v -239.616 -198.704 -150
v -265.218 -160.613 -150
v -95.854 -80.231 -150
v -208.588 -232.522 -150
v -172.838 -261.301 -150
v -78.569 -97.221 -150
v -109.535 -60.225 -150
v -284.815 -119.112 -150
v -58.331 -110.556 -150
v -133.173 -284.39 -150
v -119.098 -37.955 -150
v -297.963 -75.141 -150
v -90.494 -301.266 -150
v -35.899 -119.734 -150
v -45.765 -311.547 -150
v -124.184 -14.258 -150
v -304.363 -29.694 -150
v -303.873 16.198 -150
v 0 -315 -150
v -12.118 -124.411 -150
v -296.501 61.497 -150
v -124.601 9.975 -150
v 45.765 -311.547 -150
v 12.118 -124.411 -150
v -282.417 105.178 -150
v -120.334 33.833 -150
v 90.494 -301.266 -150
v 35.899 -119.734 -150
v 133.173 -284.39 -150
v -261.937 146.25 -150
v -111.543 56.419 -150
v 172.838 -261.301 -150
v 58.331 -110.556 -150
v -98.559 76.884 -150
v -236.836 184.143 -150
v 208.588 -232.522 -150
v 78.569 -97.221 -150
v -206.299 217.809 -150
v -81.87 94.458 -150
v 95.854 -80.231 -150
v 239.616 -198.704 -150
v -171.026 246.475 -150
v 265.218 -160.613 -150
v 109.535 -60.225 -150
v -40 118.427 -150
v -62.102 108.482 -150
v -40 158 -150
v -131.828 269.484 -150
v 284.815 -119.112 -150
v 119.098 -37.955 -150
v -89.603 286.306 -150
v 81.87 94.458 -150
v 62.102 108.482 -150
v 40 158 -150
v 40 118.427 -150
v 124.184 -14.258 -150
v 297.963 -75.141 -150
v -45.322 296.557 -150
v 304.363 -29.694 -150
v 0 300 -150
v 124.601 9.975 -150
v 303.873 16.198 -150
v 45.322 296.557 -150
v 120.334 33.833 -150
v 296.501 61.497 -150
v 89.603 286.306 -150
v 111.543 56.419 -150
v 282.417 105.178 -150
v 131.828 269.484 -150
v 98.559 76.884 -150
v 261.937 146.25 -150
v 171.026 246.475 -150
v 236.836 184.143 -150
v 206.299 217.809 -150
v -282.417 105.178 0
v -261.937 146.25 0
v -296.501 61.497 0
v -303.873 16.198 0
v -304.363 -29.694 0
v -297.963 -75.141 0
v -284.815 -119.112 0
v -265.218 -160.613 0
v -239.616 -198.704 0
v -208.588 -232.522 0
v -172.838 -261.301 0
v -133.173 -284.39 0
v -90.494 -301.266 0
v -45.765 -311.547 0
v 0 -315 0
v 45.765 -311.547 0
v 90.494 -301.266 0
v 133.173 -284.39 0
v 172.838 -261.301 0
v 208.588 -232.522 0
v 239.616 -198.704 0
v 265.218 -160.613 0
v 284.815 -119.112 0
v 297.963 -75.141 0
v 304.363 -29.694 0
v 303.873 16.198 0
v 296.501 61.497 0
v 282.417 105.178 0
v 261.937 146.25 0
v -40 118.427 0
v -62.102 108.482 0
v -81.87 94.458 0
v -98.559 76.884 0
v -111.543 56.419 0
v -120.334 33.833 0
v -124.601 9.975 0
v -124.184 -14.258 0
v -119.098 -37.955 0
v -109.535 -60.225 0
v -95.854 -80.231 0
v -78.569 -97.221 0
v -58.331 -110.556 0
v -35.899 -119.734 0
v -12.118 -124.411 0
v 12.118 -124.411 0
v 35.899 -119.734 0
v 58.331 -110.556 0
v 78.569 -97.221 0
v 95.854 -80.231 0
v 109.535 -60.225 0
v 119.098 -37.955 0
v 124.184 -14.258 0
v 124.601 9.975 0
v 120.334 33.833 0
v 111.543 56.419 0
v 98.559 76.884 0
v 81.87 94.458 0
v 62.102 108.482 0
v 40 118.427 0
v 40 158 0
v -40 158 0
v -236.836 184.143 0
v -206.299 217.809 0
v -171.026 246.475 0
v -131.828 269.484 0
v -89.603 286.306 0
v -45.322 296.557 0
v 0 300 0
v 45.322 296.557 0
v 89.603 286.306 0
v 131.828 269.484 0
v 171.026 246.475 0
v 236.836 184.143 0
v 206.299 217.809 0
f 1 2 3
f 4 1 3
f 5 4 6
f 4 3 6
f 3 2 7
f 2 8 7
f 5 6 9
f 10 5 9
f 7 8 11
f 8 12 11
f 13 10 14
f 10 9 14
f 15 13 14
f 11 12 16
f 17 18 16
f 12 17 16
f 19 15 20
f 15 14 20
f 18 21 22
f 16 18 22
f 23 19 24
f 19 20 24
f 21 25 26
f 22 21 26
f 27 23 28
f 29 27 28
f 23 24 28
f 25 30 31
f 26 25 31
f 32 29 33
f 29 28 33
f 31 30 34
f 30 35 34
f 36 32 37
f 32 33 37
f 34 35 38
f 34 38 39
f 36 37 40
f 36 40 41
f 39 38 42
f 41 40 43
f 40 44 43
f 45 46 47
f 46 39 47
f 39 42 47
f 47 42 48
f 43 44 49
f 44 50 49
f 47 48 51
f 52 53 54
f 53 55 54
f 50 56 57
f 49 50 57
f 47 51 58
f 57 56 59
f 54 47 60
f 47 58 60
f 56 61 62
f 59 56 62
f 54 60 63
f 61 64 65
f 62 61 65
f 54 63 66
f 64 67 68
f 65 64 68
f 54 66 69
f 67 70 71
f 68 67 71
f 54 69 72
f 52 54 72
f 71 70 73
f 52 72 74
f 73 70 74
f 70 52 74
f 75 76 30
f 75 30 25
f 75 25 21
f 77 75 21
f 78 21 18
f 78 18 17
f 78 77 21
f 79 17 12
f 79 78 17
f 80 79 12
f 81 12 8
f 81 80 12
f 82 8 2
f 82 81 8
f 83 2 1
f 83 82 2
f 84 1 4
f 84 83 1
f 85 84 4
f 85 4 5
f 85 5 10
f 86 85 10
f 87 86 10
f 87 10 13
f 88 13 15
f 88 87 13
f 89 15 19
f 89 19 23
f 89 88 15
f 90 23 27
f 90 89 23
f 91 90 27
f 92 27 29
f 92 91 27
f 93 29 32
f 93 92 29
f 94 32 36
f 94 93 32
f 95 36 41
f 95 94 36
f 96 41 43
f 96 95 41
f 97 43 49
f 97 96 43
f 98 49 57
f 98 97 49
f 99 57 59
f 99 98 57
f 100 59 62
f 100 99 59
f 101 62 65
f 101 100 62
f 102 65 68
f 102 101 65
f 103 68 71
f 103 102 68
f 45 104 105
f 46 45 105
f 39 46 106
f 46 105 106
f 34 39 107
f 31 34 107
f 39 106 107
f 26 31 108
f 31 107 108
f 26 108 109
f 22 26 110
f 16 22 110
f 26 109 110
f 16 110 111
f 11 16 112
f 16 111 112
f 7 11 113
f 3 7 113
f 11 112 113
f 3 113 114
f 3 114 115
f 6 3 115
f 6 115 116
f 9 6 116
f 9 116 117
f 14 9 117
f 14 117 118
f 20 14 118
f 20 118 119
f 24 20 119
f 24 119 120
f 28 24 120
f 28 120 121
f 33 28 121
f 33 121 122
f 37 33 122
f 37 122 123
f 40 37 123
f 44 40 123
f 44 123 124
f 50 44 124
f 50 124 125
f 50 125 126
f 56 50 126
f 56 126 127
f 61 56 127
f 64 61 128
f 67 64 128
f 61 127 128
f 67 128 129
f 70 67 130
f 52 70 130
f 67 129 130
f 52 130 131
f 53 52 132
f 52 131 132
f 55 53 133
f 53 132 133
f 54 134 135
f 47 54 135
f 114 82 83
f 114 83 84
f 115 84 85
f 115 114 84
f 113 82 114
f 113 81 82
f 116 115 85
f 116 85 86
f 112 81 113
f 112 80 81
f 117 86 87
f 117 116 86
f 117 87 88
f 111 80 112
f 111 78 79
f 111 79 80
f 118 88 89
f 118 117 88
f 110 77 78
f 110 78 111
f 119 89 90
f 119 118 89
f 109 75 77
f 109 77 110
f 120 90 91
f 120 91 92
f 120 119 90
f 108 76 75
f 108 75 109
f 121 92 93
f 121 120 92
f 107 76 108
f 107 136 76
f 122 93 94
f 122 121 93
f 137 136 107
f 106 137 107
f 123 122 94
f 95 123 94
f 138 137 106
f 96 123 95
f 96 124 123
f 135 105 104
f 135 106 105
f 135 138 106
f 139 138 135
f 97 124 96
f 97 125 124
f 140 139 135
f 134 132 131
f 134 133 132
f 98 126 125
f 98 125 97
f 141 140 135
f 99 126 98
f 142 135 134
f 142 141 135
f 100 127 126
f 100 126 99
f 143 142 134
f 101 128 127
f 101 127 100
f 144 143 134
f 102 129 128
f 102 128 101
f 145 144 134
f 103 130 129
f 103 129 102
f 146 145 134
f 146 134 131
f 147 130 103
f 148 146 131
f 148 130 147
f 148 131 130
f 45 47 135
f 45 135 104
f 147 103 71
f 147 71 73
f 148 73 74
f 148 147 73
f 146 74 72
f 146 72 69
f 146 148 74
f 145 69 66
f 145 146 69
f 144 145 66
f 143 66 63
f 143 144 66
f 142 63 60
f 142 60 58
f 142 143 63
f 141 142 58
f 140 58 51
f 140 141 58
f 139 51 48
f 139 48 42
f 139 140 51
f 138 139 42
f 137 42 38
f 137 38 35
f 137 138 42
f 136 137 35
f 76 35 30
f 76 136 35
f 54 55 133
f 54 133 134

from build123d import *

# Parameters (mm, degrees)
F1_DEPTH = 150
F3_DEPTH = 264.16


with BuildPart() as f1:
    # F0 (on Top) → F1 (new body)
    with BuildSketch(Plane.XY):
        with BuildLine():
            ThreePointArc((-261.9368960265, 146.25), (-75.5610057902, -290.3283217393), (300, 0))
            ThreePointArc((300, 0), (290.3283217393, 75.5610057902), (261.9368960265, 146.25))
            ThreePointArc((261.9368960265, 146.25), (0, 295), (-261.9368960265, 146.25))
        make_face()
        with BuildLine():
            ThreePointArc((261.9368960265, 146.25), (290.3283217393, 75.5610057902), (300, 0))
            ThreePointArc((300, 0), (-75.5610057902, -290.3283217393), (-261.9368960265, 146.25))
            ThreePointArc((-261.9368960265, 146.25), (-81.0377896784, -304.0372028231), (305, -10))
            ThreePointArc((305, -10), (294.0372028231, 71.0377896784), (261.9368960265, 146.25))
        make_face()
        with BuildLine():
            ThreePointArc((-261.9368960265, 146.25), (0, 295), (261.9368960265, 146.25))
            ThreePointArc((261.9368960265, 146.25), (0, 300), (-261.9368960265, 146.25))
        make_face()
    extrude(amount=-F1_DEPTH)

    # F2 (on Top) → F3 (cut)
    with BuildSketch(Plane.XY):
        with BuildLine():
            ThreePointArc((-40, 118.4271928233), (-72.8868986856, -101.5504800579), (125, 0))
            ThreePointArc((125, 0), (101.5504800579, 72.8868986856), (40, 118.4271928233))
            Line((40, 118.4271928233), (40, 0))
            Line((40, 0), (-40, 0))
            Line((-40, 0), (-40, 118.4271928233))
        make_face()
        with BuildLine():
            Line((40, 0), (40, 118.4271928233))
            ThreePointArc((40, 118.4271928233), (0, 125), (-40, 118.4271928233))
            Line((-40, 118.4271928233), (-40, 0))
            Line((-40, 0), (40, 0))
        make_face()
        with BuildLine():
            ThreePointArc((-40, 118.4271928233), (0, 125), (40, 118.4271928233))
            Line((40, 118.4271928233), (40, 158))
            Line((40, 158), (-40, 158))
            Line((-40, 158), (-40, 118.4271928233))
        make_face()
    extrude(amount=-F3_DEPTH, mode=Mode.SUBTRACT)


solid = f1.part
